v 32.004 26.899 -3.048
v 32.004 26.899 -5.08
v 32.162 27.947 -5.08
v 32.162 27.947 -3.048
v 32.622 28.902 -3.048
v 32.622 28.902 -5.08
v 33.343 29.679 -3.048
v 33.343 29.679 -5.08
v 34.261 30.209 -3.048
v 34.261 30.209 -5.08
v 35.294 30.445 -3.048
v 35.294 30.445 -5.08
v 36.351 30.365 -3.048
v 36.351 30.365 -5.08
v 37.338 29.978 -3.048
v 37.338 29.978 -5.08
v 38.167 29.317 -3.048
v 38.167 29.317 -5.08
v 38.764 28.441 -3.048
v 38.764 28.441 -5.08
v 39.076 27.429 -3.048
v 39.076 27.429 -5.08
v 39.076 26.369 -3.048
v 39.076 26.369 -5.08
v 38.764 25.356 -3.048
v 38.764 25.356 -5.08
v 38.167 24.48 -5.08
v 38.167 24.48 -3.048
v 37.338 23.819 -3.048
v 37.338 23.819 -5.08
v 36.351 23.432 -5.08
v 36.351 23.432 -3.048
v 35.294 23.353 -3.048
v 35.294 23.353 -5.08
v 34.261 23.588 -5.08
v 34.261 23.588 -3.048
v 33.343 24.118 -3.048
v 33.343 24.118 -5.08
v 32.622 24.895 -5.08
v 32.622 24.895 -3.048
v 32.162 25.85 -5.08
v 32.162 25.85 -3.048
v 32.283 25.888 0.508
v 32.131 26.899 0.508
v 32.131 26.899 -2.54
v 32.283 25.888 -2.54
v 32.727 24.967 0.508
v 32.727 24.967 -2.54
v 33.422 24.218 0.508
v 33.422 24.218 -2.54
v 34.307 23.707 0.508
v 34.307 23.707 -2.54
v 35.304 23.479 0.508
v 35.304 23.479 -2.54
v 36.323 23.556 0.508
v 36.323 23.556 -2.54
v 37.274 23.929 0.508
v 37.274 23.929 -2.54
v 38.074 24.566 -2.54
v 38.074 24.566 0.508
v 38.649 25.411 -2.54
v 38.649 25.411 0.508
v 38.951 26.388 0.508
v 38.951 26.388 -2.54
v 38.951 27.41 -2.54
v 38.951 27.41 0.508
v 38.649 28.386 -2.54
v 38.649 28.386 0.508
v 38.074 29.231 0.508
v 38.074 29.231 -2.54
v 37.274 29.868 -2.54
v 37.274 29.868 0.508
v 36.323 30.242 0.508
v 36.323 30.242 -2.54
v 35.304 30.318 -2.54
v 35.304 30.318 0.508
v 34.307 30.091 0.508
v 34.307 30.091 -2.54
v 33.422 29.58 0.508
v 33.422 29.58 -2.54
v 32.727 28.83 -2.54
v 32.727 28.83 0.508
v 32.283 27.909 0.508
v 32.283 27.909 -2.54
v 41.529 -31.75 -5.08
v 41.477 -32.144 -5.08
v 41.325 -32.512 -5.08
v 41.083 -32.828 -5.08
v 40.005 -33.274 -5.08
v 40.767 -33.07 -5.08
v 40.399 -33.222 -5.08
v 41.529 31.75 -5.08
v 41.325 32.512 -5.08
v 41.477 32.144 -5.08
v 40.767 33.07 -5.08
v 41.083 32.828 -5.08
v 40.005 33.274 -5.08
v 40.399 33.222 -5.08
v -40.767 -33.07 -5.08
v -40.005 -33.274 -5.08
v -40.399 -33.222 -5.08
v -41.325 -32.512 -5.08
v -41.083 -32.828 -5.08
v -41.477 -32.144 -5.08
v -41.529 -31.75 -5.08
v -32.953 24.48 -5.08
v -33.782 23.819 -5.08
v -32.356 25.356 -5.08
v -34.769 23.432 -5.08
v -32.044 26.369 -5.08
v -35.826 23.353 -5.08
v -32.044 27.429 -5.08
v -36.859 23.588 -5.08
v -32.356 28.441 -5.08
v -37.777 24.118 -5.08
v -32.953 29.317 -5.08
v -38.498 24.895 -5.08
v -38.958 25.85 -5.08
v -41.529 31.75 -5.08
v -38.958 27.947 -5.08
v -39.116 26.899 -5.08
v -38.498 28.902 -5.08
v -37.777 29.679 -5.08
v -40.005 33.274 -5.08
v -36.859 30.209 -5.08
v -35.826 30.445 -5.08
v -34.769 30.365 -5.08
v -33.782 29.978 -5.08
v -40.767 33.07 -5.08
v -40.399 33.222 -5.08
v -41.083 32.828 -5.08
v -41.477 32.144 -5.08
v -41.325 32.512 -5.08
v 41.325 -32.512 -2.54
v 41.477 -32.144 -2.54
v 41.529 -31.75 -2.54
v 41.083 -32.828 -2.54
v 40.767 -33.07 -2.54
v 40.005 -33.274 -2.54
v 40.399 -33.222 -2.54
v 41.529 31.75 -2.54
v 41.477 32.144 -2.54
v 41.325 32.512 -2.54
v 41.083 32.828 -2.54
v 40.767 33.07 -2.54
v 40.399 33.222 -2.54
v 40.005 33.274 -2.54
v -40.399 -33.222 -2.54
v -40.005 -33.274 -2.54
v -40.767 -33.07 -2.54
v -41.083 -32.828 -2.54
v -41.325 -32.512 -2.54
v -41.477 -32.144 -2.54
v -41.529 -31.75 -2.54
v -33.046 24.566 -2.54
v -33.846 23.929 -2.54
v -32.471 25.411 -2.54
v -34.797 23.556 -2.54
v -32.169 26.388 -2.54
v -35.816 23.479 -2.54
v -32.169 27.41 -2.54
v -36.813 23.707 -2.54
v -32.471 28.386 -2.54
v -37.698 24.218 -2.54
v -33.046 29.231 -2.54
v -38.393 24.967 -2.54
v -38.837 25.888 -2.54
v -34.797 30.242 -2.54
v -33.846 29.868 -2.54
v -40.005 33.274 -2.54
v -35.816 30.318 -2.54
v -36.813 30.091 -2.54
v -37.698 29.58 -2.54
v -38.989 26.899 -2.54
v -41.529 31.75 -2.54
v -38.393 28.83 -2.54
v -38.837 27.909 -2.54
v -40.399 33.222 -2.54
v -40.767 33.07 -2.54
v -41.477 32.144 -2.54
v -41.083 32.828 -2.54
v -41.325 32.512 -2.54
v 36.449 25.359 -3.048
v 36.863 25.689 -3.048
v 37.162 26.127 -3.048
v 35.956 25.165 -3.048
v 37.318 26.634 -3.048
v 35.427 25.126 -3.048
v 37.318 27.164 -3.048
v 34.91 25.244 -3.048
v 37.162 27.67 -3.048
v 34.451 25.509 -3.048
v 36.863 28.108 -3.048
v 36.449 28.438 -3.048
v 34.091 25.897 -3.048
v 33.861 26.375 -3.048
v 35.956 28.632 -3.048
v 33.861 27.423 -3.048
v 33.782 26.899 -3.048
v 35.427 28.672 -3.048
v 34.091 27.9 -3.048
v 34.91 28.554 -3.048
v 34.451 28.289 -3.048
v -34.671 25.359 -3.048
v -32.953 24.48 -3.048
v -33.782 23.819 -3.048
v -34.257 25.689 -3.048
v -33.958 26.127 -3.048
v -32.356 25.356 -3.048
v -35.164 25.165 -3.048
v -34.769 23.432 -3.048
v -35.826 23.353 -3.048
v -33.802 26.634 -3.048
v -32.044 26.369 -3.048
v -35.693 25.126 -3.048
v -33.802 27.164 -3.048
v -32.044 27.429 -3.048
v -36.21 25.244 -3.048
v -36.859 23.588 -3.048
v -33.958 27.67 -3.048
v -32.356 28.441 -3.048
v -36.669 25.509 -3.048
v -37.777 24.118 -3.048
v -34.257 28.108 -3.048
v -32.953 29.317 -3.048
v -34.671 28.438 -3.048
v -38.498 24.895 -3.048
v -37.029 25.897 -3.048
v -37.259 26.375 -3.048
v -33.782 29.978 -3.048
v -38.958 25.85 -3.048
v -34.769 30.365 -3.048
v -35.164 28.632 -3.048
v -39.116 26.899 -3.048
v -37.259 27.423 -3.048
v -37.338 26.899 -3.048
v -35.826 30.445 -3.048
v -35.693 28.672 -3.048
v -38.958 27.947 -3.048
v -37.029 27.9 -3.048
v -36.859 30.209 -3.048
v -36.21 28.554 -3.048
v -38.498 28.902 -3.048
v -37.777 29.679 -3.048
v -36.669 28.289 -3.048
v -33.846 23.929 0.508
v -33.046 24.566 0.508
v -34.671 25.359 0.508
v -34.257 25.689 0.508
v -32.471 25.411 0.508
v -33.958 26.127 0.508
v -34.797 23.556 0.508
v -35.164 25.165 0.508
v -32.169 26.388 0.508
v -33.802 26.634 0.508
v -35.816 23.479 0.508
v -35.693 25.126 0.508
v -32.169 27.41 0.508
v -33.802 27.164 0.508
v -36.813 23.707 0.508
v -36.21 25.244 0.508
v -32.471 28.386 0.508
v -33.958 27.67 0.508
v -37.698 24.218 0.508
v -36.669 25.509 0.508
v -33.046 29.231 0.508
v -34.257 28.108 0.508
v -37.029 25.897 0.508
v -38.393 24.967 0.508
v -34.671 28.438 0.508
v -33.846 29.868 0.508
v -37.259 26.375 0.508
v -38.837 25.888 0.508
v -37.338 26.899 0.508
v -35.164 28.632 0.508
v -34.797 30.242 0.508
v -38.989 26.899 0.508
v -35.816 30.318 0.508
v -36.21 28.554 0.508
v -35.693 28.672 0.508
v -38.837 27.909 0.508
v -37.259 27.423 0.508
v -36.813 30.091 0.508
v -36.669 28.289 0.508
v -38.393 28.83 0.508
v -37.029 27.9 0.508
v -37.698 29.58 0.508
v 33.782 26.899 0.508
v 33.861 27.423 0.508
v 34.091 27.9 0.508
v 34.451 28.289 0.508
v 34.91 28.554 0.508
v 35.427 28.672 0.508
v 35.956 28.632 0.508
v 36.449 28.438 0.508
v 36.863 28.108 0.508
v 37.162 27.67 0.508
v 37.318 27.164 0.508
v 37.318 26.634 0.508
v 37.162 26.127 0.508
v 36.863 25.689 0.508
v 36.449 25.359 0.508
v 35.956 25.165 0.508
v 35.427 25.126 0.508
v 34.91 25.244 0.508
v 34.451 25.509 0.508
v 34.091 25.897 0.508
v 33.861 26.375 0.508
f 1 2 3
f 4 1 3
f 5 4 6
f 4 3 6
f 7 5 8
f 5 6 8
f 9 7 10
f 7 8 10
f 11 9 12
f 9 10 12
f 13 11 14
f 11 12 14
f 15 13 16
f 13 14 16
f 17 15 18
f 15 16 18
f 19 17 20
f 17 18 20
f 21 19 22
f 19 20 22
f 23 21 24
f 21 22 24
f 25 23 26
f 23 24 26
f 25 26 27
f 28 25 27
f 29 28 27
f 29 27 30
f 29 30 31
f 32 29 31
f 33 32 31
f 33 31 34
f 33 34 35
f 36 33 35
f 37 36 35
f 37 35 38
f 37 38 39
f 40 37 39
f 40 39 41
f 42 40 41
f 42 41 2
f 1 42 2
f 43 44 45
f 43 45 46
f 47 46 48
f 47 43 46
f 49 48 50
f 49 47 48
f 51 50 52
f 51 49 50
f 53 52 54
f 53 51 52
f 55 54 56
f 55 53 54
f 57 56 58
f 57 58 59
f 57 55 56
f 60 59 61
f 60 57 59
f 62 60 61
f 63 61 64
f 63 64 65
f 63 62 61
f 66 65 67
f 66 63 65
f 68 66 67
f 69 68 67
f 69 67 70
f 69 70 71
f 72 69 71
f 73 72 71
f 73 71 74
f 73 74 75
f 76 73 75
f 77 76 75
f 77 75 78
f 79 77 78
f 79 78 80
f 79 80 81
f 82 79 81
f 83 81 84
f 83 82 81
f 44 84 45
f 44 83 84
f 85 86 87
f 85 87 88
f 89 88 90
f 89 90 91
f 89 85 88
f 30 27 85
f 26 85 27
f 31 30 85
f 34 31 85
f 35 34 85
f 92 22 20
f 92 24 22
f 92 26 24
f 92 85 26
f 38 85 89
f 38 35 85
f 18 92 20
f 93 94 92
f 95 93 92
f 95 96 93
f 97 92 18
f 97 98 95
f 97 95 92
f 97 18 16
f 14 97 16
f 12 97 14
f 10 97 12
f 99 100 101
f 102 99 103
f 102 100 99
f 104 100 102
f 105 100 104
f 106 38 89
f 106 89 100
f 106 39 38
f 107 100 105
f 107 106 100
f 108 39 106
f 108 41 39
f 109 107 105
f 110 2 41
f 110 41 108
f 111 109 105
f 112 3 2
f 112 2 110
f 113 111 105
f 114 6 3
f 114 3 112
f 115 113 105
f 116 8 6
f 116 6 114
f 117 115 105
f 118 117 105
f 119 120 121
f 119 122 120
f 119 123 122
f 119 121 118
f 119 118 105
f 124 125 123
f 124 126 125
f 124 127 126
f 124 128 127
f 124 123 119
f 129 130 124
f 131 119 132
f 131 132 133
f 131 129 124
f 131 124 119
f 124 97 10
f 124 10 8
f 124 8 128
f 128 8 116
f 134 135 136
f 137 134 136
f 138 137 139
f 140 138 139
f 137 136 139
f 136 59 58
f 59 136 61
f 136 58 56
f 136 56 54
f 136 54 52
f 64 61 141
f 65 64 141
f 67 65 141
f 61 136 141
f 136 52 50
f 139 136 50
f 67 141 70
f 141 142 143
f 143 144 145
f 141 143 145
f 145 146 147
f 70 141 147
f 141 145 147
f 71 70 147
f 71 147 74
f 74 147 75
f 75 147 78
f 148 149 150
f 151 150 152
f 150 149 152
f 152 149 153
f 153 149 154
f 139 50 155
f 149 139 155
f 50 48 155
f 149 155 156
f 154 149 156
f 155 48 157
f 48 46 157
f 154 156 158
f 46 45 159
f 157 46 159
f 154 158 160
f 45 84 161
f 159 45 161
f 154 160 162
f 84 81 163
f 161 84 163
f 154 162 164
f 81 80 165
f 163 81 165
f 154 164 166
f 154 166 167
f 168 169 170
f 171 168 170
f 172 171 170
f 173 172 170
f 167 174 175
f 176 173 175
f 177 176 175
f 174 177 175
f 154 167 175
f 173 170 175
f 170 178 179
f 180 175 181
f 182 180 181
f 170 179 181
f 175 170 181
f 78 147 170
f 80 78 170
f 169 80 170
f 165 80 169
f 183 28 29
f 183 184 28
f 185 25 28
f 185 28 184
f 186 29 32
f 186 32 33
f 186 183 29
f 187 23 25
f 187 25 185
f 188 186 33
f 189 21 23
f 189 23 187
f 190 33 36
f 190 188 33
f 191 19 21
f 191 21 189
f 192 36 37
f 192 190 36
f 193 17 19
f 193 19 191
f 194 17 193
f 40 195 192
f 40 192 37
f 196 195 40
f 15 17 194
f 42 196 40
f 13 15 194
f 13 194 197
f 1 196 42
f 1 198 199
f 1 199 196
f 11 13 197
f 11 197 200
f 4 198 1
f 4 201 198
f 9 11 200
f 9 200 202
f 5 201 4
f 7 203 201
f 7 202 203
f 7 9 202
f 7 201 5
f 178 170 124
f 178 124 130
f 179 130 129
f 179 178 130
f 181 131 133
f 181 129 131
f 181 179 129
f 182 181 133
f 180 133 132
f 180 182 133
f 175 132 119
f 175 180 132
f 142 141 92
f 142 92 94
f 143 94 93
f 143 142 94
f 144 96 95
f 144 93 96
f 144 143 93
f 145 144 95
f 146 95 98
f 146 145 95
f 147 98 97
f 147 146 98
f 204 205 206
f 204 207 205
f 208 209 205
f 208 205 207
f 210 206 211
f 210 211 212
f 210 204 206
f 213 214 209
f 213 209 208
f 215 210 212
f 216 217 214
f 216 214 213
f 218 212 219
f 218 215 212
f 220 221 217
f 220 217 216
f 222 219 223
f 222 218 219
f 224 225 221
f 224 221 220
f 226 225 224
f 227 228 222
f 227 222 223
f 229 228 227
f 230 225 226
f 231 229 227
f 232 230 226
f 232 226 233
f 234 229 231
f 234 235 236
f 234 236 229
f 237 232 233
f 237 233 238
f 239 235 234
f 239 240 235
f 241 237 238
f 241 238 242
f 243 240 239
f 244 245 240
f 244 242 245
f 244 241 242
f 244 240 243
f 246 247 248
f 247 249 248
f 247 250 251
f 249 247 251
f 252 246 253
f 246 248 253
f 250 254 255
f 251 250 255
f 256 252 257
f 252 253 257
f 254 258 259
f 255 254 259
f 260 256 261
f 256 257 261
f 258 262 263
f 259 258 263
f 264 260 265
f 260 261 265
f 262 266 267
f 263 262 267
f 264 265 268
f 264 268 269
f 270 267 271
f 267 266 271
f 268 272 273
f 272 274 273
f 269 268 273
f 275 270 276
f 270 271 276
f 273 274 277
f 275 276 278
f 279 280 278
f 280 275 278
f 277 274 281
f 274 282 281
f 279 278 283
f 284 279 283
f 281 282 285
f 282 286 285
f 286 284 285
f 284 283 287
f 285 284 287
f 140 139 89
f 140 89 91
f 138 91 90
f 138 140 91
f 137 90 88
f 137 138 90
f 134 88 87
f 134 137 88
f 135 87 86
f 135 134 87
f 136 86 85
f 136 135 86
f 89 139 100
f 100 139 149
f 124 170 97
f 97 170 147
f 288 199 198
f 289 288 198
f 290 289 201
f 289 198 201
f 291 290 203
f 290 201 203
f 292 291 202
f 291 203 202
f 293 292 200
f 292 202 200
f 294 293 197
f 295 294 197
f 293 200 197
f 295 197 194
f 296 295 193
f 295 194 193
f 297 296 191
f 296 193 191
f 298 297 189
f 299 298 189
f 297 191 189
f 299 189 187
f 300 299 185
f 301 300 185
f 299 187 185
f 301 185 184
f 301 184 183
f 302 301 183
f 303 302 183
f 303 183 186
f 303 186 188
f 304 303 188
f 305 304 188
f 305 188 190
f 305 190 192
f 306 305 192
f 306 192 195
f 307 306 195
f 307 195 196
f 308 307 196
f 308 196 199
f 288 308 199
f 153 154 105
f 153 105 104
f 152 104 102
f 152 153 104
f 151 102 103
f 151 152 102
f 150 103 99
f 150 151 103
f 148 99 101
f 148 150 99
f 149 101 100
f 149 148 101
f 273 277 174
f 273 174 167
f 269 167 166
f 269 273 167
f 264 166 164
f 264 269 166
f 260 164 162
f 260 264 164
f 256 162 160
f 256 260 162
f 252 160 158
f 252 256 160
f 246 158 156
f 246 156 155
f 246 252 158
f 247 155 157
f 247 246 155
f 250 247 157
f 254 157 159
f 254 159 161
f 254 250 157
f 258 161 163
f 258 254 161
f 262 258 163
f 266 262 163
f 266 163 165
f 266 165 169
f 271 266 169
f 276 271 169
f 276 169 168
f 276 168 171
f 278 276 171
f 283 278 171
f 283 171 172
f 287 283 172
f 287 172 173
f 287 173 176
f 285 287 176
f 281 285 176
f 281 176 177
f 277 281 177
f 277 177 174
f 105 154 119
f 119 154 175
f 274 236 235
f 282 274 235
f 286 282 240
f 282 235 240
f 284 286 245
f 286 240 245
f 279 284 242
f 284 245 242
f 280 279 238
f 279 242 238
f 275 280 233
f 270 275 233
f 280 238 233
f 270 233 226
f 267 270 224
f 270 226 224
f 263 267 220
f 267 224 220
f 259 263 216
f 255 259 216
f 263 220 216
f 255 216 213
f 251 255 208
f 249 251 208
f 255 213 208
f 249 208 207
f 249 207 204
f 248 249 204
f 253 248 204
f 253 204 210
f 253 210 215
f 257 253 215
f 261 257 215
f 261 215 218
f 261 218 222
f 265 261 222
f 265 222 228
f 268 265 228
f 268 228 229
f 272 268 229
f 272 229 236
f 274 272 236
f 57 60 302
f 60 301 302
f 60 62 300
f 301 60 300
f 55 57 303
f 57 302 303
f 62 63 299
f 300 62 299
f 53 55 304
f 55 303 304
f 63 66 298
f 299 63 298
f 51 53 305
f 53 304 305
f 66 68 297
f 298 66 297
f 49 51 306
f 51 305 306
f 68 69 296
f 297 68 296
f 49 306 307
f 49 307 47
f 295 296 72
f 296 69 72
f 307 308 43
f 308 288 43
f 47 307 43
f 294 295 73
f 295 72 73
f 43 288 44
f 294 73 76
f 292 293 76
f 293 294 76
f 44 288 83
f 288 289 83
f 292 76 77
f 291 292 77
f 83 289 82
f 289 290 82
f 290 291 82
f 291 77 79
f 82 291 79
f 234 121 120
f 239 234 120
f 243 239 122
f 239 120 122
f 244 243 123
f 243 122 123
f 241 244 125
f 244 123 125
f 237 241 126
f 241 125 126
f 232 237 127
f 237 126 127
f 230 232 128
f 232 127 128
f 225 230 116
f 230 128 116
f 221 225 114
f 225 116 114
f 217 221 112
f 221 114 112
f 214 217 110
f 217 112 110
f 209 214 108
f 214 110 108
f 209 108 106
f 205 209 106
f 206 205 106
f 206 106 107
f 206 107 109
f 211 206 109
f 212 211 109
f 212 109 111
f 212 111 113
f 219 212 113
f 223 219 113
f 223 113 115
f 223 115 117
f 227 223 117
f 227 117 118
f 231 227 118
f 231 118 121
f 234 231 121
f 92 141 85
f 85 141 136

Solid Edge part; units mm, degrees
sketch "Sketch1" plane through (0, 2.54, -2.54) normal (0, 0, -1) x (-1, 0, 0)
  line L0 (-41.529, 29.21) -> (-41.529, -34.29)
  arc A0 (-41.529, -34.29) -> (-40.005, -35.814) centre (-40.005, -34.29) ccw
  line L1 (-40.005, -35.814) -> (40.005, -35.814)
  arc A1 (40.005, -35.814) -> (41.529, -34.29) centre (40.005, -34.29) ccw
  line L2 (41.529, -34.29) -> (41.529, 29.21)
  arc A2 (41.529, 29.21) -> (40.005, 30.734) centre (40.005, 29.21) ccw
  line L3 (40.005, 30.734) -> (-40.005, 30.734)
  arc A3 (-40.005, 30.734) -> (-41.529, 29.21) centre (-40.005, 29.21) ccw
  dimension "D1" = 0.254
extrude "Protrusion1" add sketch "Sketch1" along normal blind 2.54
sketch "Sketch2" plane through (36.703, 28.2448, 0.508) normal (0, 0, -1) x (-1, 0, 0)
  circle A0 centre (72.263, -1.3462) radius 3.429
  circle A1 centre (1.143, -1.3462) radius 3.429
  dimension "D1" = 6.858
extrude "ExtrudedProtrusion_2" add sketch "Sketch2" along normal up to next
sketch "Sketch3" plane through (0, 0, -5.08) normal (0, 0, -1) x (-1, 0, 0)
  circle A0 centre (-35.56, 26.8986) radius 1.778
  circle A1 centre (35.56, 26.8986) radius 1.778
  dimension "D1" = 3.556
extrude "Cutout1" cut sketch "Sketch3" against normal up to next
sketch "Sketch4" plane through (0, 0, -5.08) normal (0, 0, -1) x (-1, 0, 0)
  circle A0 centre (-35.56, 26.8986) radius 3.556
  circle A1 centre (35.56, 26.8986) radius 3.556
  dimension "D1" = 7.112
extrude "ExtrudedCutout_2" cut sketch "Sketch4" against normal blind 2.032
fillet "Round_1" [suppressed]
